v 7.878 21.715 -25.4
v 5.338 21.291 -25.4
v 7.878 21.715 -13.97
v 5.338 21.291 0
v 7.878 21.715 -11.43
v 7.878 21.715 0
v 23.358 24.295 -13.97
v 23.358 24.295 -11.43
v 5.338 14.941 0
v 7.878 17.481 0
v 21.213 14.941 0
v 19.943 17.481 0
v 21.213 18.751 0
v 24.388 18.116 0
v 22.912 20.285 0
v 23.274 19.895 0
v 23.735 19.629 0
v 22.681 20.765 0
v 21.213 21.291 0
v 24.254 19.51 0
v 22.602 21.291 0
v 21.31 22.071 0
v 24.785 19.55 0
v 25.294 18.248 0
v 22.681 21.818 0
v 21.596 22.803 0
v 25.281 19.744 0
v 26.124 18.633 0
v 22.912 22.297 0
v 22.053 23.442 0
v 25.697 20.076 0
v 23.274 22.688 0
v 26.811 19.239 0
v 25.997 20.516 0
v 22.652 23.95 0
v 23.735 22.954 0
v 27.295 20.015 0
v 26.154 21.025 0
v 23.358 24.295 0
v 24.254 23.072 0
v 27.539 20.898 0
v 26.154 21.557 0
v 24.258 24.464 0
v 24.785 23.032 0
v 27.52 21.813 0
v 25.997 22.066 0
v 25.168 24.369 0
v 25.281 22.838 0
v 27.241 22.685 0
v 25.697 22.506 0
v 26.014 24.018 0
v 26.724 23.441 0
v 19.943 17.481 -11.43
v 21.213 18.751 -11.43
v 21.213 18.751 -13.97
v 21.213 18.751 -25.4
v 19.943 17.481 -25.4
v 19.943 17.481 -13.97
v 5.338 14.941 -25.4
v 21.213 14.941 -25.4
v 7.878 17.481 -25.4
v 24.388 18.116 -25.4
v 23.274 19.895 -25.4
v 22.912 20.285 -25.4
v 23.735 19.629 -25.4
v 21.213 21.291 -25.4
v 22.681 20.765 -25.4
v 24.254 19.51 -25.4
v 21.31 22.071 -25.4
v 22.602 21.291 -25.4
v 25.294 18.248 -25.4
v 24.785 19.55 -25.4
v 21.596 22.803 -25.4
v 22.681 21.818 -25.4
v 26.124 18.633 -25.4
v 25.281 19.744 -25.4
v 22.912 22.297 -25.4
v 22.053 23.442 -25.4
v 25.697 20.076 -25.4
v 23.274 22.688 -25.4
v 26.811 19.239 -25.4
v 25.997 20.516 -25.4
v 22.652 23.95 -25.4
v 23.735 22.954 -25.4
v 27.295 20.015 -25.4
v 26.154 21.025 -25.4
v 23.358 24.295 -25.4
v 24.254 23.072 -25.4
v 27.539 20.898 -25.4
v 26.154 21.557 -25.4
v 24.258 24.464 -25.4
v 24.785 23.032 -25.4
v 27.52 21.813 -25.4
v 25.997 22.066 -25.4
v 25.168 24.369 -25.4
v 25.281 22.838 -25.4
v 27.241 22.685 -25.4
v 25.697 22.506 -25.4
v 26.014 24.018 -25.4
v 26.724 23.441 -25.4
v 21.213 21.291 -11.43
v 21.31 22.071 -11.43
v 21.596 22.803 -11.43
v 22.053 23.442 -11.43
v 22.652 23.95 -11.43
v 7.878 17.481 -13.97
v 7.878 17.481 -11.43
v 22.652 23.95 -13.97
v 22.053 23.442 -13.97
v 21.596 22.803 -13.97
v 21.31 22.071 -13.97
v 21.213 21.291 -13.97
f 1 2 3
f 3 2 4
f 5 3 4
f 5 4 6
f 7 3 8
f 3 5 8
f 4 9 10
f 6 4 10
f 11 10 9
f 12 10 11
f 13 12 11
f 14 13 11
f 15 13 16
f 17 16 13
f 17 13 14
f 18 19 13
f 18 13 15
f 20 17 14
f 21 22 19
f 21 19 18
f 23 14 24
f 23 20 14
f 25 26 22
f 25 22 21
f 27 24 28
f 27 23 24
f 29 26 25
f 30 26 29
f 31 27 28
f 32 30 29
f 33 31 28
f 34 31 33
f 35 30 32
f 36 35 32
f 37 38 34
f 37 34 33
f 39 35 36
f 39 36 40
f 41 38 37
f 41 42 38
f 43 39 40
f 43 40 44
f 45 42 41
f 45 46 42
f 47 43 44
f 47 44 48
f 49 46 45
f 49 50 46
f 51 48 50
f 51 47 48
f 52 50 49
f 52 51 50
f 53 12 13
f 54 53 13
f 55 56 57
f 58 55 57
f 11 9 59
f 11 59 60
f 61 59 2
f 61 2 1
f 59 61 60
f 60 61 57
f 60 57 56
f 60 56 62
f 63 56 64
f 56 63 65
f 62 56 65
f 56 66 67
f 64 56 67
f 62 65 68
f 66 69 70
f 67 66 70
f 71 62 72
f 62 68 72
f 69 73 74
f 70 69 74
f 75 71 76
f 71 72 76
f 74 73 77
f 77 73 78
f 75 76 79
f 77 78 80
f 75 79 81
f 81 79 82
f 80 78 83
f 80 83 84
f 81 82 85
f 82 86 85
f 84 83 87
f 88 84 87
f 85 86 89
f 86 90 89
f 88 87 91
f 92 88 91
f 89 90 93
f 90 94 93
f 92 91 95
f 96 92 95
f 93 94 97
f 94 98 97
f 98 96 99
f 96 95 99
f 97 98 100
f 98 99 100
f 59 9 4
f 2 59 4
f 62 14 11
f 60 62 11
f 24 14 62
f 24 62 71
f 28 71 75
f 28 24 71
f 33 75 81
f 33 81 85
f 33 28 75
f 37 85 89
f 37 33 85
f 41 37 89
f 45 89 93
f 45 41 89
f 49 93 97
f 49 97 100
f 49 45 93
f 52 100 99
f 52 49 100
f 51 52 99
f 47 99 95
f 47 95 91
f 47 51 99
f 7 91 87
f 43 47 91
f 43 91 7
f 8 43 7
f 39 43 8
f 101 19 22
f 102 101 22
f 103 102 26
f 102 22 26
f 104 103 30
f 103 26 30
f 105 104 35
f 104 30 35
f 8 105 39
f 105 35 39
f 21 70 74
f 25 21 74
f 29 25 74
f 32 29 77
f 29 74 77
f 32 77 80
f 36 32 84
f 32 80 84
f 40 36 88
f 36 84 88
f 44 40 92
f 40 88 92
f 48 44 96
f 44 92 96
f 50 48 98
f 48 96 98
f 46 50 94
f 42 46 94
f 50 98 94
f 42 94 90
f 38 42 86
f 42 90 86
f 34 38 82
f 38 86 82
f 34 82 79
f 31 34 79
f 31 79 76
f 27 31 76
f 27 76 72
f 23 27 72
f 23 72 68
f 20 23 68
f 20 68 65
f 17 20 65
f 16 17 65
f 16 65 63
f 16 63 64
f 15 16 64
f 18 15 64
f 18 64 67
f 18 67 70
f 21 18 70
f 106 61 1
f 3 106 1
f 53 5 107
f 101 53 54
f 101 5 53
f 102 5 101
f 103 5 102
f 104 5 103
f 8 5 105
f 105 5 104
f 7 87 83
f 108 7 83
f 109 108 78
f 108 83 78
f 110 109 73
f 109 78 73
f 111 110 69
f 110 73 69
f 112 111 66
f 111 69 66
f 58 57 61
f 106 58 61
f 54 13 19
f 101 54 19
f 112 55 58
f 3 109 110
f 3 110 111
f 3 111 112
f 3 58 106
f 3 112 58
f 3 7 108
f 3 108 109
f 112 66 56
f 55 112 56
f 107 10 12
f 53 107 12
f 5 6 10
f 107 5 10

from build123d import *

# Parameters (mm, degrees)
SKETCH1_W                       = 19.05
SKETCH1_H                       = 6.35
BOSS_EXTRUDE1_DEPTH             = 25.4
SKETCH2_R                       = 3.175
BOSS_EXTRUDE3_DEPTH             = 25.4
CUT_EXTRUDE5_DEPTH              = 11.43
CUT_EXTRUDE6_DEPTH              = 26.4
CUT_EXTRUDE9_DEPTH              = 11.43
F_9_64_0_14063_DIAMETER_HOLE3_D = 3.572002


with BuildPart() as part:
    # Sketch1 → Boss-Extrude1 (new body)
    with BuildSketch(Plane.XY):
        Polygon((24.387960916, 24.466176471), (24.387960916, 21.291176471), (5.337960916, 21.291176471), align=None)
        with Locations((14.862960916, 18.116176471)):
            Rectangle(SKETCH1_W, SKETCH1_H)
    extrude(amount=-BOSS_EXTRUDE1_DEPTH)

    # Sketch2 → Boss-Extrude3 (add)
    with BuildSketch(Plane.XY):
        with Locations((24.387960916, 21.291176471)):
            Circle(SKETCH2_R)
    extrude(amount=-BOSS_EXTRUDE3_DEPTH)

    # Sketch9 → Cut-Extrude5 (cut)
    with BuildSketch(Plane.XY):
        with BuildLine():
            Line((23.358231186, 24.294554849), (7.877960916, 21.714509804))
            Line((7.877960916, 21.714509804), (7.877960916, 17.481176471))
            Line((7.877960916, 17.481176471), (19.942960916, 17.481176471))
            Line((19.942960916, 17.481176471), (21.212960916, 18.751176471))
            Line((21.212960916, 18.751176471), (21.212960916, 21.291176471))
            ThreePointArc((21.212960916, 21.291176471), (21.804357145, 23.136607736), (23.358231186, 24.294554849))
        make_face()
    extrude(amount=-CUT_EXTRUDE5_DEPTH, mode=Mode.SUBTRACT)

    # Sketch10 → Cut-Extrude6 (cut, through all)
    with BuildSketch(Plane.XY):
        Polygon((24.387960916, 18.116176471), (21.212960916, 14.941176471), (24.387960916, 14.941176471), align=None)
    extrude(amount=-CUT_EXTRUDE6_DEPTH, mode=Mode.SUBTRACT)

    # Sketch17 → Cut-Extrude9 (cut)
    with BuildSketch(Plane(origin=(0, 0, -25.4), x_dir=(-1, 0, 0), z_dir=(0, 0, -1))):
        with BuildLine():
            Line((-7.877960916, 21.714509804), (-23.358231186, 24.294554849))
            ThreePointArc((-23.358231186, 24.294554849), (-21.804357145, 23.136607736), (-21.212960916, 21.291176471))
            Line((-21.212960916, 21.291176471), (-21.212960916, 18.751176471))
            Line((-21.212960916, 18.751176471), (-19.942960916, 17.481176471))
            Line((-19.942960916, 17.481176471), (-7.877960916, 17.481176471))
            Line((-7.877960916, 17.481176471), (-7.877960916, 21.714509804))
        make_face()
    extrude(amount=-CUT_EXTRUDE9_DEPTH, mode=Mode.SUBTRACT)

    # 9/64 (0.14063) Diameter Hole3 (through all)
    with Locations(Plane(origin=(24.387960916, 21.291176471, 0), x_dir=(1, 0, 0), z_dir=(0, 0, 1))):
        with Locations((0, 0)):
            Hole(F_9_64_0_14063_DIAMETER_HOLE3_D / 2)


solid = part.part
